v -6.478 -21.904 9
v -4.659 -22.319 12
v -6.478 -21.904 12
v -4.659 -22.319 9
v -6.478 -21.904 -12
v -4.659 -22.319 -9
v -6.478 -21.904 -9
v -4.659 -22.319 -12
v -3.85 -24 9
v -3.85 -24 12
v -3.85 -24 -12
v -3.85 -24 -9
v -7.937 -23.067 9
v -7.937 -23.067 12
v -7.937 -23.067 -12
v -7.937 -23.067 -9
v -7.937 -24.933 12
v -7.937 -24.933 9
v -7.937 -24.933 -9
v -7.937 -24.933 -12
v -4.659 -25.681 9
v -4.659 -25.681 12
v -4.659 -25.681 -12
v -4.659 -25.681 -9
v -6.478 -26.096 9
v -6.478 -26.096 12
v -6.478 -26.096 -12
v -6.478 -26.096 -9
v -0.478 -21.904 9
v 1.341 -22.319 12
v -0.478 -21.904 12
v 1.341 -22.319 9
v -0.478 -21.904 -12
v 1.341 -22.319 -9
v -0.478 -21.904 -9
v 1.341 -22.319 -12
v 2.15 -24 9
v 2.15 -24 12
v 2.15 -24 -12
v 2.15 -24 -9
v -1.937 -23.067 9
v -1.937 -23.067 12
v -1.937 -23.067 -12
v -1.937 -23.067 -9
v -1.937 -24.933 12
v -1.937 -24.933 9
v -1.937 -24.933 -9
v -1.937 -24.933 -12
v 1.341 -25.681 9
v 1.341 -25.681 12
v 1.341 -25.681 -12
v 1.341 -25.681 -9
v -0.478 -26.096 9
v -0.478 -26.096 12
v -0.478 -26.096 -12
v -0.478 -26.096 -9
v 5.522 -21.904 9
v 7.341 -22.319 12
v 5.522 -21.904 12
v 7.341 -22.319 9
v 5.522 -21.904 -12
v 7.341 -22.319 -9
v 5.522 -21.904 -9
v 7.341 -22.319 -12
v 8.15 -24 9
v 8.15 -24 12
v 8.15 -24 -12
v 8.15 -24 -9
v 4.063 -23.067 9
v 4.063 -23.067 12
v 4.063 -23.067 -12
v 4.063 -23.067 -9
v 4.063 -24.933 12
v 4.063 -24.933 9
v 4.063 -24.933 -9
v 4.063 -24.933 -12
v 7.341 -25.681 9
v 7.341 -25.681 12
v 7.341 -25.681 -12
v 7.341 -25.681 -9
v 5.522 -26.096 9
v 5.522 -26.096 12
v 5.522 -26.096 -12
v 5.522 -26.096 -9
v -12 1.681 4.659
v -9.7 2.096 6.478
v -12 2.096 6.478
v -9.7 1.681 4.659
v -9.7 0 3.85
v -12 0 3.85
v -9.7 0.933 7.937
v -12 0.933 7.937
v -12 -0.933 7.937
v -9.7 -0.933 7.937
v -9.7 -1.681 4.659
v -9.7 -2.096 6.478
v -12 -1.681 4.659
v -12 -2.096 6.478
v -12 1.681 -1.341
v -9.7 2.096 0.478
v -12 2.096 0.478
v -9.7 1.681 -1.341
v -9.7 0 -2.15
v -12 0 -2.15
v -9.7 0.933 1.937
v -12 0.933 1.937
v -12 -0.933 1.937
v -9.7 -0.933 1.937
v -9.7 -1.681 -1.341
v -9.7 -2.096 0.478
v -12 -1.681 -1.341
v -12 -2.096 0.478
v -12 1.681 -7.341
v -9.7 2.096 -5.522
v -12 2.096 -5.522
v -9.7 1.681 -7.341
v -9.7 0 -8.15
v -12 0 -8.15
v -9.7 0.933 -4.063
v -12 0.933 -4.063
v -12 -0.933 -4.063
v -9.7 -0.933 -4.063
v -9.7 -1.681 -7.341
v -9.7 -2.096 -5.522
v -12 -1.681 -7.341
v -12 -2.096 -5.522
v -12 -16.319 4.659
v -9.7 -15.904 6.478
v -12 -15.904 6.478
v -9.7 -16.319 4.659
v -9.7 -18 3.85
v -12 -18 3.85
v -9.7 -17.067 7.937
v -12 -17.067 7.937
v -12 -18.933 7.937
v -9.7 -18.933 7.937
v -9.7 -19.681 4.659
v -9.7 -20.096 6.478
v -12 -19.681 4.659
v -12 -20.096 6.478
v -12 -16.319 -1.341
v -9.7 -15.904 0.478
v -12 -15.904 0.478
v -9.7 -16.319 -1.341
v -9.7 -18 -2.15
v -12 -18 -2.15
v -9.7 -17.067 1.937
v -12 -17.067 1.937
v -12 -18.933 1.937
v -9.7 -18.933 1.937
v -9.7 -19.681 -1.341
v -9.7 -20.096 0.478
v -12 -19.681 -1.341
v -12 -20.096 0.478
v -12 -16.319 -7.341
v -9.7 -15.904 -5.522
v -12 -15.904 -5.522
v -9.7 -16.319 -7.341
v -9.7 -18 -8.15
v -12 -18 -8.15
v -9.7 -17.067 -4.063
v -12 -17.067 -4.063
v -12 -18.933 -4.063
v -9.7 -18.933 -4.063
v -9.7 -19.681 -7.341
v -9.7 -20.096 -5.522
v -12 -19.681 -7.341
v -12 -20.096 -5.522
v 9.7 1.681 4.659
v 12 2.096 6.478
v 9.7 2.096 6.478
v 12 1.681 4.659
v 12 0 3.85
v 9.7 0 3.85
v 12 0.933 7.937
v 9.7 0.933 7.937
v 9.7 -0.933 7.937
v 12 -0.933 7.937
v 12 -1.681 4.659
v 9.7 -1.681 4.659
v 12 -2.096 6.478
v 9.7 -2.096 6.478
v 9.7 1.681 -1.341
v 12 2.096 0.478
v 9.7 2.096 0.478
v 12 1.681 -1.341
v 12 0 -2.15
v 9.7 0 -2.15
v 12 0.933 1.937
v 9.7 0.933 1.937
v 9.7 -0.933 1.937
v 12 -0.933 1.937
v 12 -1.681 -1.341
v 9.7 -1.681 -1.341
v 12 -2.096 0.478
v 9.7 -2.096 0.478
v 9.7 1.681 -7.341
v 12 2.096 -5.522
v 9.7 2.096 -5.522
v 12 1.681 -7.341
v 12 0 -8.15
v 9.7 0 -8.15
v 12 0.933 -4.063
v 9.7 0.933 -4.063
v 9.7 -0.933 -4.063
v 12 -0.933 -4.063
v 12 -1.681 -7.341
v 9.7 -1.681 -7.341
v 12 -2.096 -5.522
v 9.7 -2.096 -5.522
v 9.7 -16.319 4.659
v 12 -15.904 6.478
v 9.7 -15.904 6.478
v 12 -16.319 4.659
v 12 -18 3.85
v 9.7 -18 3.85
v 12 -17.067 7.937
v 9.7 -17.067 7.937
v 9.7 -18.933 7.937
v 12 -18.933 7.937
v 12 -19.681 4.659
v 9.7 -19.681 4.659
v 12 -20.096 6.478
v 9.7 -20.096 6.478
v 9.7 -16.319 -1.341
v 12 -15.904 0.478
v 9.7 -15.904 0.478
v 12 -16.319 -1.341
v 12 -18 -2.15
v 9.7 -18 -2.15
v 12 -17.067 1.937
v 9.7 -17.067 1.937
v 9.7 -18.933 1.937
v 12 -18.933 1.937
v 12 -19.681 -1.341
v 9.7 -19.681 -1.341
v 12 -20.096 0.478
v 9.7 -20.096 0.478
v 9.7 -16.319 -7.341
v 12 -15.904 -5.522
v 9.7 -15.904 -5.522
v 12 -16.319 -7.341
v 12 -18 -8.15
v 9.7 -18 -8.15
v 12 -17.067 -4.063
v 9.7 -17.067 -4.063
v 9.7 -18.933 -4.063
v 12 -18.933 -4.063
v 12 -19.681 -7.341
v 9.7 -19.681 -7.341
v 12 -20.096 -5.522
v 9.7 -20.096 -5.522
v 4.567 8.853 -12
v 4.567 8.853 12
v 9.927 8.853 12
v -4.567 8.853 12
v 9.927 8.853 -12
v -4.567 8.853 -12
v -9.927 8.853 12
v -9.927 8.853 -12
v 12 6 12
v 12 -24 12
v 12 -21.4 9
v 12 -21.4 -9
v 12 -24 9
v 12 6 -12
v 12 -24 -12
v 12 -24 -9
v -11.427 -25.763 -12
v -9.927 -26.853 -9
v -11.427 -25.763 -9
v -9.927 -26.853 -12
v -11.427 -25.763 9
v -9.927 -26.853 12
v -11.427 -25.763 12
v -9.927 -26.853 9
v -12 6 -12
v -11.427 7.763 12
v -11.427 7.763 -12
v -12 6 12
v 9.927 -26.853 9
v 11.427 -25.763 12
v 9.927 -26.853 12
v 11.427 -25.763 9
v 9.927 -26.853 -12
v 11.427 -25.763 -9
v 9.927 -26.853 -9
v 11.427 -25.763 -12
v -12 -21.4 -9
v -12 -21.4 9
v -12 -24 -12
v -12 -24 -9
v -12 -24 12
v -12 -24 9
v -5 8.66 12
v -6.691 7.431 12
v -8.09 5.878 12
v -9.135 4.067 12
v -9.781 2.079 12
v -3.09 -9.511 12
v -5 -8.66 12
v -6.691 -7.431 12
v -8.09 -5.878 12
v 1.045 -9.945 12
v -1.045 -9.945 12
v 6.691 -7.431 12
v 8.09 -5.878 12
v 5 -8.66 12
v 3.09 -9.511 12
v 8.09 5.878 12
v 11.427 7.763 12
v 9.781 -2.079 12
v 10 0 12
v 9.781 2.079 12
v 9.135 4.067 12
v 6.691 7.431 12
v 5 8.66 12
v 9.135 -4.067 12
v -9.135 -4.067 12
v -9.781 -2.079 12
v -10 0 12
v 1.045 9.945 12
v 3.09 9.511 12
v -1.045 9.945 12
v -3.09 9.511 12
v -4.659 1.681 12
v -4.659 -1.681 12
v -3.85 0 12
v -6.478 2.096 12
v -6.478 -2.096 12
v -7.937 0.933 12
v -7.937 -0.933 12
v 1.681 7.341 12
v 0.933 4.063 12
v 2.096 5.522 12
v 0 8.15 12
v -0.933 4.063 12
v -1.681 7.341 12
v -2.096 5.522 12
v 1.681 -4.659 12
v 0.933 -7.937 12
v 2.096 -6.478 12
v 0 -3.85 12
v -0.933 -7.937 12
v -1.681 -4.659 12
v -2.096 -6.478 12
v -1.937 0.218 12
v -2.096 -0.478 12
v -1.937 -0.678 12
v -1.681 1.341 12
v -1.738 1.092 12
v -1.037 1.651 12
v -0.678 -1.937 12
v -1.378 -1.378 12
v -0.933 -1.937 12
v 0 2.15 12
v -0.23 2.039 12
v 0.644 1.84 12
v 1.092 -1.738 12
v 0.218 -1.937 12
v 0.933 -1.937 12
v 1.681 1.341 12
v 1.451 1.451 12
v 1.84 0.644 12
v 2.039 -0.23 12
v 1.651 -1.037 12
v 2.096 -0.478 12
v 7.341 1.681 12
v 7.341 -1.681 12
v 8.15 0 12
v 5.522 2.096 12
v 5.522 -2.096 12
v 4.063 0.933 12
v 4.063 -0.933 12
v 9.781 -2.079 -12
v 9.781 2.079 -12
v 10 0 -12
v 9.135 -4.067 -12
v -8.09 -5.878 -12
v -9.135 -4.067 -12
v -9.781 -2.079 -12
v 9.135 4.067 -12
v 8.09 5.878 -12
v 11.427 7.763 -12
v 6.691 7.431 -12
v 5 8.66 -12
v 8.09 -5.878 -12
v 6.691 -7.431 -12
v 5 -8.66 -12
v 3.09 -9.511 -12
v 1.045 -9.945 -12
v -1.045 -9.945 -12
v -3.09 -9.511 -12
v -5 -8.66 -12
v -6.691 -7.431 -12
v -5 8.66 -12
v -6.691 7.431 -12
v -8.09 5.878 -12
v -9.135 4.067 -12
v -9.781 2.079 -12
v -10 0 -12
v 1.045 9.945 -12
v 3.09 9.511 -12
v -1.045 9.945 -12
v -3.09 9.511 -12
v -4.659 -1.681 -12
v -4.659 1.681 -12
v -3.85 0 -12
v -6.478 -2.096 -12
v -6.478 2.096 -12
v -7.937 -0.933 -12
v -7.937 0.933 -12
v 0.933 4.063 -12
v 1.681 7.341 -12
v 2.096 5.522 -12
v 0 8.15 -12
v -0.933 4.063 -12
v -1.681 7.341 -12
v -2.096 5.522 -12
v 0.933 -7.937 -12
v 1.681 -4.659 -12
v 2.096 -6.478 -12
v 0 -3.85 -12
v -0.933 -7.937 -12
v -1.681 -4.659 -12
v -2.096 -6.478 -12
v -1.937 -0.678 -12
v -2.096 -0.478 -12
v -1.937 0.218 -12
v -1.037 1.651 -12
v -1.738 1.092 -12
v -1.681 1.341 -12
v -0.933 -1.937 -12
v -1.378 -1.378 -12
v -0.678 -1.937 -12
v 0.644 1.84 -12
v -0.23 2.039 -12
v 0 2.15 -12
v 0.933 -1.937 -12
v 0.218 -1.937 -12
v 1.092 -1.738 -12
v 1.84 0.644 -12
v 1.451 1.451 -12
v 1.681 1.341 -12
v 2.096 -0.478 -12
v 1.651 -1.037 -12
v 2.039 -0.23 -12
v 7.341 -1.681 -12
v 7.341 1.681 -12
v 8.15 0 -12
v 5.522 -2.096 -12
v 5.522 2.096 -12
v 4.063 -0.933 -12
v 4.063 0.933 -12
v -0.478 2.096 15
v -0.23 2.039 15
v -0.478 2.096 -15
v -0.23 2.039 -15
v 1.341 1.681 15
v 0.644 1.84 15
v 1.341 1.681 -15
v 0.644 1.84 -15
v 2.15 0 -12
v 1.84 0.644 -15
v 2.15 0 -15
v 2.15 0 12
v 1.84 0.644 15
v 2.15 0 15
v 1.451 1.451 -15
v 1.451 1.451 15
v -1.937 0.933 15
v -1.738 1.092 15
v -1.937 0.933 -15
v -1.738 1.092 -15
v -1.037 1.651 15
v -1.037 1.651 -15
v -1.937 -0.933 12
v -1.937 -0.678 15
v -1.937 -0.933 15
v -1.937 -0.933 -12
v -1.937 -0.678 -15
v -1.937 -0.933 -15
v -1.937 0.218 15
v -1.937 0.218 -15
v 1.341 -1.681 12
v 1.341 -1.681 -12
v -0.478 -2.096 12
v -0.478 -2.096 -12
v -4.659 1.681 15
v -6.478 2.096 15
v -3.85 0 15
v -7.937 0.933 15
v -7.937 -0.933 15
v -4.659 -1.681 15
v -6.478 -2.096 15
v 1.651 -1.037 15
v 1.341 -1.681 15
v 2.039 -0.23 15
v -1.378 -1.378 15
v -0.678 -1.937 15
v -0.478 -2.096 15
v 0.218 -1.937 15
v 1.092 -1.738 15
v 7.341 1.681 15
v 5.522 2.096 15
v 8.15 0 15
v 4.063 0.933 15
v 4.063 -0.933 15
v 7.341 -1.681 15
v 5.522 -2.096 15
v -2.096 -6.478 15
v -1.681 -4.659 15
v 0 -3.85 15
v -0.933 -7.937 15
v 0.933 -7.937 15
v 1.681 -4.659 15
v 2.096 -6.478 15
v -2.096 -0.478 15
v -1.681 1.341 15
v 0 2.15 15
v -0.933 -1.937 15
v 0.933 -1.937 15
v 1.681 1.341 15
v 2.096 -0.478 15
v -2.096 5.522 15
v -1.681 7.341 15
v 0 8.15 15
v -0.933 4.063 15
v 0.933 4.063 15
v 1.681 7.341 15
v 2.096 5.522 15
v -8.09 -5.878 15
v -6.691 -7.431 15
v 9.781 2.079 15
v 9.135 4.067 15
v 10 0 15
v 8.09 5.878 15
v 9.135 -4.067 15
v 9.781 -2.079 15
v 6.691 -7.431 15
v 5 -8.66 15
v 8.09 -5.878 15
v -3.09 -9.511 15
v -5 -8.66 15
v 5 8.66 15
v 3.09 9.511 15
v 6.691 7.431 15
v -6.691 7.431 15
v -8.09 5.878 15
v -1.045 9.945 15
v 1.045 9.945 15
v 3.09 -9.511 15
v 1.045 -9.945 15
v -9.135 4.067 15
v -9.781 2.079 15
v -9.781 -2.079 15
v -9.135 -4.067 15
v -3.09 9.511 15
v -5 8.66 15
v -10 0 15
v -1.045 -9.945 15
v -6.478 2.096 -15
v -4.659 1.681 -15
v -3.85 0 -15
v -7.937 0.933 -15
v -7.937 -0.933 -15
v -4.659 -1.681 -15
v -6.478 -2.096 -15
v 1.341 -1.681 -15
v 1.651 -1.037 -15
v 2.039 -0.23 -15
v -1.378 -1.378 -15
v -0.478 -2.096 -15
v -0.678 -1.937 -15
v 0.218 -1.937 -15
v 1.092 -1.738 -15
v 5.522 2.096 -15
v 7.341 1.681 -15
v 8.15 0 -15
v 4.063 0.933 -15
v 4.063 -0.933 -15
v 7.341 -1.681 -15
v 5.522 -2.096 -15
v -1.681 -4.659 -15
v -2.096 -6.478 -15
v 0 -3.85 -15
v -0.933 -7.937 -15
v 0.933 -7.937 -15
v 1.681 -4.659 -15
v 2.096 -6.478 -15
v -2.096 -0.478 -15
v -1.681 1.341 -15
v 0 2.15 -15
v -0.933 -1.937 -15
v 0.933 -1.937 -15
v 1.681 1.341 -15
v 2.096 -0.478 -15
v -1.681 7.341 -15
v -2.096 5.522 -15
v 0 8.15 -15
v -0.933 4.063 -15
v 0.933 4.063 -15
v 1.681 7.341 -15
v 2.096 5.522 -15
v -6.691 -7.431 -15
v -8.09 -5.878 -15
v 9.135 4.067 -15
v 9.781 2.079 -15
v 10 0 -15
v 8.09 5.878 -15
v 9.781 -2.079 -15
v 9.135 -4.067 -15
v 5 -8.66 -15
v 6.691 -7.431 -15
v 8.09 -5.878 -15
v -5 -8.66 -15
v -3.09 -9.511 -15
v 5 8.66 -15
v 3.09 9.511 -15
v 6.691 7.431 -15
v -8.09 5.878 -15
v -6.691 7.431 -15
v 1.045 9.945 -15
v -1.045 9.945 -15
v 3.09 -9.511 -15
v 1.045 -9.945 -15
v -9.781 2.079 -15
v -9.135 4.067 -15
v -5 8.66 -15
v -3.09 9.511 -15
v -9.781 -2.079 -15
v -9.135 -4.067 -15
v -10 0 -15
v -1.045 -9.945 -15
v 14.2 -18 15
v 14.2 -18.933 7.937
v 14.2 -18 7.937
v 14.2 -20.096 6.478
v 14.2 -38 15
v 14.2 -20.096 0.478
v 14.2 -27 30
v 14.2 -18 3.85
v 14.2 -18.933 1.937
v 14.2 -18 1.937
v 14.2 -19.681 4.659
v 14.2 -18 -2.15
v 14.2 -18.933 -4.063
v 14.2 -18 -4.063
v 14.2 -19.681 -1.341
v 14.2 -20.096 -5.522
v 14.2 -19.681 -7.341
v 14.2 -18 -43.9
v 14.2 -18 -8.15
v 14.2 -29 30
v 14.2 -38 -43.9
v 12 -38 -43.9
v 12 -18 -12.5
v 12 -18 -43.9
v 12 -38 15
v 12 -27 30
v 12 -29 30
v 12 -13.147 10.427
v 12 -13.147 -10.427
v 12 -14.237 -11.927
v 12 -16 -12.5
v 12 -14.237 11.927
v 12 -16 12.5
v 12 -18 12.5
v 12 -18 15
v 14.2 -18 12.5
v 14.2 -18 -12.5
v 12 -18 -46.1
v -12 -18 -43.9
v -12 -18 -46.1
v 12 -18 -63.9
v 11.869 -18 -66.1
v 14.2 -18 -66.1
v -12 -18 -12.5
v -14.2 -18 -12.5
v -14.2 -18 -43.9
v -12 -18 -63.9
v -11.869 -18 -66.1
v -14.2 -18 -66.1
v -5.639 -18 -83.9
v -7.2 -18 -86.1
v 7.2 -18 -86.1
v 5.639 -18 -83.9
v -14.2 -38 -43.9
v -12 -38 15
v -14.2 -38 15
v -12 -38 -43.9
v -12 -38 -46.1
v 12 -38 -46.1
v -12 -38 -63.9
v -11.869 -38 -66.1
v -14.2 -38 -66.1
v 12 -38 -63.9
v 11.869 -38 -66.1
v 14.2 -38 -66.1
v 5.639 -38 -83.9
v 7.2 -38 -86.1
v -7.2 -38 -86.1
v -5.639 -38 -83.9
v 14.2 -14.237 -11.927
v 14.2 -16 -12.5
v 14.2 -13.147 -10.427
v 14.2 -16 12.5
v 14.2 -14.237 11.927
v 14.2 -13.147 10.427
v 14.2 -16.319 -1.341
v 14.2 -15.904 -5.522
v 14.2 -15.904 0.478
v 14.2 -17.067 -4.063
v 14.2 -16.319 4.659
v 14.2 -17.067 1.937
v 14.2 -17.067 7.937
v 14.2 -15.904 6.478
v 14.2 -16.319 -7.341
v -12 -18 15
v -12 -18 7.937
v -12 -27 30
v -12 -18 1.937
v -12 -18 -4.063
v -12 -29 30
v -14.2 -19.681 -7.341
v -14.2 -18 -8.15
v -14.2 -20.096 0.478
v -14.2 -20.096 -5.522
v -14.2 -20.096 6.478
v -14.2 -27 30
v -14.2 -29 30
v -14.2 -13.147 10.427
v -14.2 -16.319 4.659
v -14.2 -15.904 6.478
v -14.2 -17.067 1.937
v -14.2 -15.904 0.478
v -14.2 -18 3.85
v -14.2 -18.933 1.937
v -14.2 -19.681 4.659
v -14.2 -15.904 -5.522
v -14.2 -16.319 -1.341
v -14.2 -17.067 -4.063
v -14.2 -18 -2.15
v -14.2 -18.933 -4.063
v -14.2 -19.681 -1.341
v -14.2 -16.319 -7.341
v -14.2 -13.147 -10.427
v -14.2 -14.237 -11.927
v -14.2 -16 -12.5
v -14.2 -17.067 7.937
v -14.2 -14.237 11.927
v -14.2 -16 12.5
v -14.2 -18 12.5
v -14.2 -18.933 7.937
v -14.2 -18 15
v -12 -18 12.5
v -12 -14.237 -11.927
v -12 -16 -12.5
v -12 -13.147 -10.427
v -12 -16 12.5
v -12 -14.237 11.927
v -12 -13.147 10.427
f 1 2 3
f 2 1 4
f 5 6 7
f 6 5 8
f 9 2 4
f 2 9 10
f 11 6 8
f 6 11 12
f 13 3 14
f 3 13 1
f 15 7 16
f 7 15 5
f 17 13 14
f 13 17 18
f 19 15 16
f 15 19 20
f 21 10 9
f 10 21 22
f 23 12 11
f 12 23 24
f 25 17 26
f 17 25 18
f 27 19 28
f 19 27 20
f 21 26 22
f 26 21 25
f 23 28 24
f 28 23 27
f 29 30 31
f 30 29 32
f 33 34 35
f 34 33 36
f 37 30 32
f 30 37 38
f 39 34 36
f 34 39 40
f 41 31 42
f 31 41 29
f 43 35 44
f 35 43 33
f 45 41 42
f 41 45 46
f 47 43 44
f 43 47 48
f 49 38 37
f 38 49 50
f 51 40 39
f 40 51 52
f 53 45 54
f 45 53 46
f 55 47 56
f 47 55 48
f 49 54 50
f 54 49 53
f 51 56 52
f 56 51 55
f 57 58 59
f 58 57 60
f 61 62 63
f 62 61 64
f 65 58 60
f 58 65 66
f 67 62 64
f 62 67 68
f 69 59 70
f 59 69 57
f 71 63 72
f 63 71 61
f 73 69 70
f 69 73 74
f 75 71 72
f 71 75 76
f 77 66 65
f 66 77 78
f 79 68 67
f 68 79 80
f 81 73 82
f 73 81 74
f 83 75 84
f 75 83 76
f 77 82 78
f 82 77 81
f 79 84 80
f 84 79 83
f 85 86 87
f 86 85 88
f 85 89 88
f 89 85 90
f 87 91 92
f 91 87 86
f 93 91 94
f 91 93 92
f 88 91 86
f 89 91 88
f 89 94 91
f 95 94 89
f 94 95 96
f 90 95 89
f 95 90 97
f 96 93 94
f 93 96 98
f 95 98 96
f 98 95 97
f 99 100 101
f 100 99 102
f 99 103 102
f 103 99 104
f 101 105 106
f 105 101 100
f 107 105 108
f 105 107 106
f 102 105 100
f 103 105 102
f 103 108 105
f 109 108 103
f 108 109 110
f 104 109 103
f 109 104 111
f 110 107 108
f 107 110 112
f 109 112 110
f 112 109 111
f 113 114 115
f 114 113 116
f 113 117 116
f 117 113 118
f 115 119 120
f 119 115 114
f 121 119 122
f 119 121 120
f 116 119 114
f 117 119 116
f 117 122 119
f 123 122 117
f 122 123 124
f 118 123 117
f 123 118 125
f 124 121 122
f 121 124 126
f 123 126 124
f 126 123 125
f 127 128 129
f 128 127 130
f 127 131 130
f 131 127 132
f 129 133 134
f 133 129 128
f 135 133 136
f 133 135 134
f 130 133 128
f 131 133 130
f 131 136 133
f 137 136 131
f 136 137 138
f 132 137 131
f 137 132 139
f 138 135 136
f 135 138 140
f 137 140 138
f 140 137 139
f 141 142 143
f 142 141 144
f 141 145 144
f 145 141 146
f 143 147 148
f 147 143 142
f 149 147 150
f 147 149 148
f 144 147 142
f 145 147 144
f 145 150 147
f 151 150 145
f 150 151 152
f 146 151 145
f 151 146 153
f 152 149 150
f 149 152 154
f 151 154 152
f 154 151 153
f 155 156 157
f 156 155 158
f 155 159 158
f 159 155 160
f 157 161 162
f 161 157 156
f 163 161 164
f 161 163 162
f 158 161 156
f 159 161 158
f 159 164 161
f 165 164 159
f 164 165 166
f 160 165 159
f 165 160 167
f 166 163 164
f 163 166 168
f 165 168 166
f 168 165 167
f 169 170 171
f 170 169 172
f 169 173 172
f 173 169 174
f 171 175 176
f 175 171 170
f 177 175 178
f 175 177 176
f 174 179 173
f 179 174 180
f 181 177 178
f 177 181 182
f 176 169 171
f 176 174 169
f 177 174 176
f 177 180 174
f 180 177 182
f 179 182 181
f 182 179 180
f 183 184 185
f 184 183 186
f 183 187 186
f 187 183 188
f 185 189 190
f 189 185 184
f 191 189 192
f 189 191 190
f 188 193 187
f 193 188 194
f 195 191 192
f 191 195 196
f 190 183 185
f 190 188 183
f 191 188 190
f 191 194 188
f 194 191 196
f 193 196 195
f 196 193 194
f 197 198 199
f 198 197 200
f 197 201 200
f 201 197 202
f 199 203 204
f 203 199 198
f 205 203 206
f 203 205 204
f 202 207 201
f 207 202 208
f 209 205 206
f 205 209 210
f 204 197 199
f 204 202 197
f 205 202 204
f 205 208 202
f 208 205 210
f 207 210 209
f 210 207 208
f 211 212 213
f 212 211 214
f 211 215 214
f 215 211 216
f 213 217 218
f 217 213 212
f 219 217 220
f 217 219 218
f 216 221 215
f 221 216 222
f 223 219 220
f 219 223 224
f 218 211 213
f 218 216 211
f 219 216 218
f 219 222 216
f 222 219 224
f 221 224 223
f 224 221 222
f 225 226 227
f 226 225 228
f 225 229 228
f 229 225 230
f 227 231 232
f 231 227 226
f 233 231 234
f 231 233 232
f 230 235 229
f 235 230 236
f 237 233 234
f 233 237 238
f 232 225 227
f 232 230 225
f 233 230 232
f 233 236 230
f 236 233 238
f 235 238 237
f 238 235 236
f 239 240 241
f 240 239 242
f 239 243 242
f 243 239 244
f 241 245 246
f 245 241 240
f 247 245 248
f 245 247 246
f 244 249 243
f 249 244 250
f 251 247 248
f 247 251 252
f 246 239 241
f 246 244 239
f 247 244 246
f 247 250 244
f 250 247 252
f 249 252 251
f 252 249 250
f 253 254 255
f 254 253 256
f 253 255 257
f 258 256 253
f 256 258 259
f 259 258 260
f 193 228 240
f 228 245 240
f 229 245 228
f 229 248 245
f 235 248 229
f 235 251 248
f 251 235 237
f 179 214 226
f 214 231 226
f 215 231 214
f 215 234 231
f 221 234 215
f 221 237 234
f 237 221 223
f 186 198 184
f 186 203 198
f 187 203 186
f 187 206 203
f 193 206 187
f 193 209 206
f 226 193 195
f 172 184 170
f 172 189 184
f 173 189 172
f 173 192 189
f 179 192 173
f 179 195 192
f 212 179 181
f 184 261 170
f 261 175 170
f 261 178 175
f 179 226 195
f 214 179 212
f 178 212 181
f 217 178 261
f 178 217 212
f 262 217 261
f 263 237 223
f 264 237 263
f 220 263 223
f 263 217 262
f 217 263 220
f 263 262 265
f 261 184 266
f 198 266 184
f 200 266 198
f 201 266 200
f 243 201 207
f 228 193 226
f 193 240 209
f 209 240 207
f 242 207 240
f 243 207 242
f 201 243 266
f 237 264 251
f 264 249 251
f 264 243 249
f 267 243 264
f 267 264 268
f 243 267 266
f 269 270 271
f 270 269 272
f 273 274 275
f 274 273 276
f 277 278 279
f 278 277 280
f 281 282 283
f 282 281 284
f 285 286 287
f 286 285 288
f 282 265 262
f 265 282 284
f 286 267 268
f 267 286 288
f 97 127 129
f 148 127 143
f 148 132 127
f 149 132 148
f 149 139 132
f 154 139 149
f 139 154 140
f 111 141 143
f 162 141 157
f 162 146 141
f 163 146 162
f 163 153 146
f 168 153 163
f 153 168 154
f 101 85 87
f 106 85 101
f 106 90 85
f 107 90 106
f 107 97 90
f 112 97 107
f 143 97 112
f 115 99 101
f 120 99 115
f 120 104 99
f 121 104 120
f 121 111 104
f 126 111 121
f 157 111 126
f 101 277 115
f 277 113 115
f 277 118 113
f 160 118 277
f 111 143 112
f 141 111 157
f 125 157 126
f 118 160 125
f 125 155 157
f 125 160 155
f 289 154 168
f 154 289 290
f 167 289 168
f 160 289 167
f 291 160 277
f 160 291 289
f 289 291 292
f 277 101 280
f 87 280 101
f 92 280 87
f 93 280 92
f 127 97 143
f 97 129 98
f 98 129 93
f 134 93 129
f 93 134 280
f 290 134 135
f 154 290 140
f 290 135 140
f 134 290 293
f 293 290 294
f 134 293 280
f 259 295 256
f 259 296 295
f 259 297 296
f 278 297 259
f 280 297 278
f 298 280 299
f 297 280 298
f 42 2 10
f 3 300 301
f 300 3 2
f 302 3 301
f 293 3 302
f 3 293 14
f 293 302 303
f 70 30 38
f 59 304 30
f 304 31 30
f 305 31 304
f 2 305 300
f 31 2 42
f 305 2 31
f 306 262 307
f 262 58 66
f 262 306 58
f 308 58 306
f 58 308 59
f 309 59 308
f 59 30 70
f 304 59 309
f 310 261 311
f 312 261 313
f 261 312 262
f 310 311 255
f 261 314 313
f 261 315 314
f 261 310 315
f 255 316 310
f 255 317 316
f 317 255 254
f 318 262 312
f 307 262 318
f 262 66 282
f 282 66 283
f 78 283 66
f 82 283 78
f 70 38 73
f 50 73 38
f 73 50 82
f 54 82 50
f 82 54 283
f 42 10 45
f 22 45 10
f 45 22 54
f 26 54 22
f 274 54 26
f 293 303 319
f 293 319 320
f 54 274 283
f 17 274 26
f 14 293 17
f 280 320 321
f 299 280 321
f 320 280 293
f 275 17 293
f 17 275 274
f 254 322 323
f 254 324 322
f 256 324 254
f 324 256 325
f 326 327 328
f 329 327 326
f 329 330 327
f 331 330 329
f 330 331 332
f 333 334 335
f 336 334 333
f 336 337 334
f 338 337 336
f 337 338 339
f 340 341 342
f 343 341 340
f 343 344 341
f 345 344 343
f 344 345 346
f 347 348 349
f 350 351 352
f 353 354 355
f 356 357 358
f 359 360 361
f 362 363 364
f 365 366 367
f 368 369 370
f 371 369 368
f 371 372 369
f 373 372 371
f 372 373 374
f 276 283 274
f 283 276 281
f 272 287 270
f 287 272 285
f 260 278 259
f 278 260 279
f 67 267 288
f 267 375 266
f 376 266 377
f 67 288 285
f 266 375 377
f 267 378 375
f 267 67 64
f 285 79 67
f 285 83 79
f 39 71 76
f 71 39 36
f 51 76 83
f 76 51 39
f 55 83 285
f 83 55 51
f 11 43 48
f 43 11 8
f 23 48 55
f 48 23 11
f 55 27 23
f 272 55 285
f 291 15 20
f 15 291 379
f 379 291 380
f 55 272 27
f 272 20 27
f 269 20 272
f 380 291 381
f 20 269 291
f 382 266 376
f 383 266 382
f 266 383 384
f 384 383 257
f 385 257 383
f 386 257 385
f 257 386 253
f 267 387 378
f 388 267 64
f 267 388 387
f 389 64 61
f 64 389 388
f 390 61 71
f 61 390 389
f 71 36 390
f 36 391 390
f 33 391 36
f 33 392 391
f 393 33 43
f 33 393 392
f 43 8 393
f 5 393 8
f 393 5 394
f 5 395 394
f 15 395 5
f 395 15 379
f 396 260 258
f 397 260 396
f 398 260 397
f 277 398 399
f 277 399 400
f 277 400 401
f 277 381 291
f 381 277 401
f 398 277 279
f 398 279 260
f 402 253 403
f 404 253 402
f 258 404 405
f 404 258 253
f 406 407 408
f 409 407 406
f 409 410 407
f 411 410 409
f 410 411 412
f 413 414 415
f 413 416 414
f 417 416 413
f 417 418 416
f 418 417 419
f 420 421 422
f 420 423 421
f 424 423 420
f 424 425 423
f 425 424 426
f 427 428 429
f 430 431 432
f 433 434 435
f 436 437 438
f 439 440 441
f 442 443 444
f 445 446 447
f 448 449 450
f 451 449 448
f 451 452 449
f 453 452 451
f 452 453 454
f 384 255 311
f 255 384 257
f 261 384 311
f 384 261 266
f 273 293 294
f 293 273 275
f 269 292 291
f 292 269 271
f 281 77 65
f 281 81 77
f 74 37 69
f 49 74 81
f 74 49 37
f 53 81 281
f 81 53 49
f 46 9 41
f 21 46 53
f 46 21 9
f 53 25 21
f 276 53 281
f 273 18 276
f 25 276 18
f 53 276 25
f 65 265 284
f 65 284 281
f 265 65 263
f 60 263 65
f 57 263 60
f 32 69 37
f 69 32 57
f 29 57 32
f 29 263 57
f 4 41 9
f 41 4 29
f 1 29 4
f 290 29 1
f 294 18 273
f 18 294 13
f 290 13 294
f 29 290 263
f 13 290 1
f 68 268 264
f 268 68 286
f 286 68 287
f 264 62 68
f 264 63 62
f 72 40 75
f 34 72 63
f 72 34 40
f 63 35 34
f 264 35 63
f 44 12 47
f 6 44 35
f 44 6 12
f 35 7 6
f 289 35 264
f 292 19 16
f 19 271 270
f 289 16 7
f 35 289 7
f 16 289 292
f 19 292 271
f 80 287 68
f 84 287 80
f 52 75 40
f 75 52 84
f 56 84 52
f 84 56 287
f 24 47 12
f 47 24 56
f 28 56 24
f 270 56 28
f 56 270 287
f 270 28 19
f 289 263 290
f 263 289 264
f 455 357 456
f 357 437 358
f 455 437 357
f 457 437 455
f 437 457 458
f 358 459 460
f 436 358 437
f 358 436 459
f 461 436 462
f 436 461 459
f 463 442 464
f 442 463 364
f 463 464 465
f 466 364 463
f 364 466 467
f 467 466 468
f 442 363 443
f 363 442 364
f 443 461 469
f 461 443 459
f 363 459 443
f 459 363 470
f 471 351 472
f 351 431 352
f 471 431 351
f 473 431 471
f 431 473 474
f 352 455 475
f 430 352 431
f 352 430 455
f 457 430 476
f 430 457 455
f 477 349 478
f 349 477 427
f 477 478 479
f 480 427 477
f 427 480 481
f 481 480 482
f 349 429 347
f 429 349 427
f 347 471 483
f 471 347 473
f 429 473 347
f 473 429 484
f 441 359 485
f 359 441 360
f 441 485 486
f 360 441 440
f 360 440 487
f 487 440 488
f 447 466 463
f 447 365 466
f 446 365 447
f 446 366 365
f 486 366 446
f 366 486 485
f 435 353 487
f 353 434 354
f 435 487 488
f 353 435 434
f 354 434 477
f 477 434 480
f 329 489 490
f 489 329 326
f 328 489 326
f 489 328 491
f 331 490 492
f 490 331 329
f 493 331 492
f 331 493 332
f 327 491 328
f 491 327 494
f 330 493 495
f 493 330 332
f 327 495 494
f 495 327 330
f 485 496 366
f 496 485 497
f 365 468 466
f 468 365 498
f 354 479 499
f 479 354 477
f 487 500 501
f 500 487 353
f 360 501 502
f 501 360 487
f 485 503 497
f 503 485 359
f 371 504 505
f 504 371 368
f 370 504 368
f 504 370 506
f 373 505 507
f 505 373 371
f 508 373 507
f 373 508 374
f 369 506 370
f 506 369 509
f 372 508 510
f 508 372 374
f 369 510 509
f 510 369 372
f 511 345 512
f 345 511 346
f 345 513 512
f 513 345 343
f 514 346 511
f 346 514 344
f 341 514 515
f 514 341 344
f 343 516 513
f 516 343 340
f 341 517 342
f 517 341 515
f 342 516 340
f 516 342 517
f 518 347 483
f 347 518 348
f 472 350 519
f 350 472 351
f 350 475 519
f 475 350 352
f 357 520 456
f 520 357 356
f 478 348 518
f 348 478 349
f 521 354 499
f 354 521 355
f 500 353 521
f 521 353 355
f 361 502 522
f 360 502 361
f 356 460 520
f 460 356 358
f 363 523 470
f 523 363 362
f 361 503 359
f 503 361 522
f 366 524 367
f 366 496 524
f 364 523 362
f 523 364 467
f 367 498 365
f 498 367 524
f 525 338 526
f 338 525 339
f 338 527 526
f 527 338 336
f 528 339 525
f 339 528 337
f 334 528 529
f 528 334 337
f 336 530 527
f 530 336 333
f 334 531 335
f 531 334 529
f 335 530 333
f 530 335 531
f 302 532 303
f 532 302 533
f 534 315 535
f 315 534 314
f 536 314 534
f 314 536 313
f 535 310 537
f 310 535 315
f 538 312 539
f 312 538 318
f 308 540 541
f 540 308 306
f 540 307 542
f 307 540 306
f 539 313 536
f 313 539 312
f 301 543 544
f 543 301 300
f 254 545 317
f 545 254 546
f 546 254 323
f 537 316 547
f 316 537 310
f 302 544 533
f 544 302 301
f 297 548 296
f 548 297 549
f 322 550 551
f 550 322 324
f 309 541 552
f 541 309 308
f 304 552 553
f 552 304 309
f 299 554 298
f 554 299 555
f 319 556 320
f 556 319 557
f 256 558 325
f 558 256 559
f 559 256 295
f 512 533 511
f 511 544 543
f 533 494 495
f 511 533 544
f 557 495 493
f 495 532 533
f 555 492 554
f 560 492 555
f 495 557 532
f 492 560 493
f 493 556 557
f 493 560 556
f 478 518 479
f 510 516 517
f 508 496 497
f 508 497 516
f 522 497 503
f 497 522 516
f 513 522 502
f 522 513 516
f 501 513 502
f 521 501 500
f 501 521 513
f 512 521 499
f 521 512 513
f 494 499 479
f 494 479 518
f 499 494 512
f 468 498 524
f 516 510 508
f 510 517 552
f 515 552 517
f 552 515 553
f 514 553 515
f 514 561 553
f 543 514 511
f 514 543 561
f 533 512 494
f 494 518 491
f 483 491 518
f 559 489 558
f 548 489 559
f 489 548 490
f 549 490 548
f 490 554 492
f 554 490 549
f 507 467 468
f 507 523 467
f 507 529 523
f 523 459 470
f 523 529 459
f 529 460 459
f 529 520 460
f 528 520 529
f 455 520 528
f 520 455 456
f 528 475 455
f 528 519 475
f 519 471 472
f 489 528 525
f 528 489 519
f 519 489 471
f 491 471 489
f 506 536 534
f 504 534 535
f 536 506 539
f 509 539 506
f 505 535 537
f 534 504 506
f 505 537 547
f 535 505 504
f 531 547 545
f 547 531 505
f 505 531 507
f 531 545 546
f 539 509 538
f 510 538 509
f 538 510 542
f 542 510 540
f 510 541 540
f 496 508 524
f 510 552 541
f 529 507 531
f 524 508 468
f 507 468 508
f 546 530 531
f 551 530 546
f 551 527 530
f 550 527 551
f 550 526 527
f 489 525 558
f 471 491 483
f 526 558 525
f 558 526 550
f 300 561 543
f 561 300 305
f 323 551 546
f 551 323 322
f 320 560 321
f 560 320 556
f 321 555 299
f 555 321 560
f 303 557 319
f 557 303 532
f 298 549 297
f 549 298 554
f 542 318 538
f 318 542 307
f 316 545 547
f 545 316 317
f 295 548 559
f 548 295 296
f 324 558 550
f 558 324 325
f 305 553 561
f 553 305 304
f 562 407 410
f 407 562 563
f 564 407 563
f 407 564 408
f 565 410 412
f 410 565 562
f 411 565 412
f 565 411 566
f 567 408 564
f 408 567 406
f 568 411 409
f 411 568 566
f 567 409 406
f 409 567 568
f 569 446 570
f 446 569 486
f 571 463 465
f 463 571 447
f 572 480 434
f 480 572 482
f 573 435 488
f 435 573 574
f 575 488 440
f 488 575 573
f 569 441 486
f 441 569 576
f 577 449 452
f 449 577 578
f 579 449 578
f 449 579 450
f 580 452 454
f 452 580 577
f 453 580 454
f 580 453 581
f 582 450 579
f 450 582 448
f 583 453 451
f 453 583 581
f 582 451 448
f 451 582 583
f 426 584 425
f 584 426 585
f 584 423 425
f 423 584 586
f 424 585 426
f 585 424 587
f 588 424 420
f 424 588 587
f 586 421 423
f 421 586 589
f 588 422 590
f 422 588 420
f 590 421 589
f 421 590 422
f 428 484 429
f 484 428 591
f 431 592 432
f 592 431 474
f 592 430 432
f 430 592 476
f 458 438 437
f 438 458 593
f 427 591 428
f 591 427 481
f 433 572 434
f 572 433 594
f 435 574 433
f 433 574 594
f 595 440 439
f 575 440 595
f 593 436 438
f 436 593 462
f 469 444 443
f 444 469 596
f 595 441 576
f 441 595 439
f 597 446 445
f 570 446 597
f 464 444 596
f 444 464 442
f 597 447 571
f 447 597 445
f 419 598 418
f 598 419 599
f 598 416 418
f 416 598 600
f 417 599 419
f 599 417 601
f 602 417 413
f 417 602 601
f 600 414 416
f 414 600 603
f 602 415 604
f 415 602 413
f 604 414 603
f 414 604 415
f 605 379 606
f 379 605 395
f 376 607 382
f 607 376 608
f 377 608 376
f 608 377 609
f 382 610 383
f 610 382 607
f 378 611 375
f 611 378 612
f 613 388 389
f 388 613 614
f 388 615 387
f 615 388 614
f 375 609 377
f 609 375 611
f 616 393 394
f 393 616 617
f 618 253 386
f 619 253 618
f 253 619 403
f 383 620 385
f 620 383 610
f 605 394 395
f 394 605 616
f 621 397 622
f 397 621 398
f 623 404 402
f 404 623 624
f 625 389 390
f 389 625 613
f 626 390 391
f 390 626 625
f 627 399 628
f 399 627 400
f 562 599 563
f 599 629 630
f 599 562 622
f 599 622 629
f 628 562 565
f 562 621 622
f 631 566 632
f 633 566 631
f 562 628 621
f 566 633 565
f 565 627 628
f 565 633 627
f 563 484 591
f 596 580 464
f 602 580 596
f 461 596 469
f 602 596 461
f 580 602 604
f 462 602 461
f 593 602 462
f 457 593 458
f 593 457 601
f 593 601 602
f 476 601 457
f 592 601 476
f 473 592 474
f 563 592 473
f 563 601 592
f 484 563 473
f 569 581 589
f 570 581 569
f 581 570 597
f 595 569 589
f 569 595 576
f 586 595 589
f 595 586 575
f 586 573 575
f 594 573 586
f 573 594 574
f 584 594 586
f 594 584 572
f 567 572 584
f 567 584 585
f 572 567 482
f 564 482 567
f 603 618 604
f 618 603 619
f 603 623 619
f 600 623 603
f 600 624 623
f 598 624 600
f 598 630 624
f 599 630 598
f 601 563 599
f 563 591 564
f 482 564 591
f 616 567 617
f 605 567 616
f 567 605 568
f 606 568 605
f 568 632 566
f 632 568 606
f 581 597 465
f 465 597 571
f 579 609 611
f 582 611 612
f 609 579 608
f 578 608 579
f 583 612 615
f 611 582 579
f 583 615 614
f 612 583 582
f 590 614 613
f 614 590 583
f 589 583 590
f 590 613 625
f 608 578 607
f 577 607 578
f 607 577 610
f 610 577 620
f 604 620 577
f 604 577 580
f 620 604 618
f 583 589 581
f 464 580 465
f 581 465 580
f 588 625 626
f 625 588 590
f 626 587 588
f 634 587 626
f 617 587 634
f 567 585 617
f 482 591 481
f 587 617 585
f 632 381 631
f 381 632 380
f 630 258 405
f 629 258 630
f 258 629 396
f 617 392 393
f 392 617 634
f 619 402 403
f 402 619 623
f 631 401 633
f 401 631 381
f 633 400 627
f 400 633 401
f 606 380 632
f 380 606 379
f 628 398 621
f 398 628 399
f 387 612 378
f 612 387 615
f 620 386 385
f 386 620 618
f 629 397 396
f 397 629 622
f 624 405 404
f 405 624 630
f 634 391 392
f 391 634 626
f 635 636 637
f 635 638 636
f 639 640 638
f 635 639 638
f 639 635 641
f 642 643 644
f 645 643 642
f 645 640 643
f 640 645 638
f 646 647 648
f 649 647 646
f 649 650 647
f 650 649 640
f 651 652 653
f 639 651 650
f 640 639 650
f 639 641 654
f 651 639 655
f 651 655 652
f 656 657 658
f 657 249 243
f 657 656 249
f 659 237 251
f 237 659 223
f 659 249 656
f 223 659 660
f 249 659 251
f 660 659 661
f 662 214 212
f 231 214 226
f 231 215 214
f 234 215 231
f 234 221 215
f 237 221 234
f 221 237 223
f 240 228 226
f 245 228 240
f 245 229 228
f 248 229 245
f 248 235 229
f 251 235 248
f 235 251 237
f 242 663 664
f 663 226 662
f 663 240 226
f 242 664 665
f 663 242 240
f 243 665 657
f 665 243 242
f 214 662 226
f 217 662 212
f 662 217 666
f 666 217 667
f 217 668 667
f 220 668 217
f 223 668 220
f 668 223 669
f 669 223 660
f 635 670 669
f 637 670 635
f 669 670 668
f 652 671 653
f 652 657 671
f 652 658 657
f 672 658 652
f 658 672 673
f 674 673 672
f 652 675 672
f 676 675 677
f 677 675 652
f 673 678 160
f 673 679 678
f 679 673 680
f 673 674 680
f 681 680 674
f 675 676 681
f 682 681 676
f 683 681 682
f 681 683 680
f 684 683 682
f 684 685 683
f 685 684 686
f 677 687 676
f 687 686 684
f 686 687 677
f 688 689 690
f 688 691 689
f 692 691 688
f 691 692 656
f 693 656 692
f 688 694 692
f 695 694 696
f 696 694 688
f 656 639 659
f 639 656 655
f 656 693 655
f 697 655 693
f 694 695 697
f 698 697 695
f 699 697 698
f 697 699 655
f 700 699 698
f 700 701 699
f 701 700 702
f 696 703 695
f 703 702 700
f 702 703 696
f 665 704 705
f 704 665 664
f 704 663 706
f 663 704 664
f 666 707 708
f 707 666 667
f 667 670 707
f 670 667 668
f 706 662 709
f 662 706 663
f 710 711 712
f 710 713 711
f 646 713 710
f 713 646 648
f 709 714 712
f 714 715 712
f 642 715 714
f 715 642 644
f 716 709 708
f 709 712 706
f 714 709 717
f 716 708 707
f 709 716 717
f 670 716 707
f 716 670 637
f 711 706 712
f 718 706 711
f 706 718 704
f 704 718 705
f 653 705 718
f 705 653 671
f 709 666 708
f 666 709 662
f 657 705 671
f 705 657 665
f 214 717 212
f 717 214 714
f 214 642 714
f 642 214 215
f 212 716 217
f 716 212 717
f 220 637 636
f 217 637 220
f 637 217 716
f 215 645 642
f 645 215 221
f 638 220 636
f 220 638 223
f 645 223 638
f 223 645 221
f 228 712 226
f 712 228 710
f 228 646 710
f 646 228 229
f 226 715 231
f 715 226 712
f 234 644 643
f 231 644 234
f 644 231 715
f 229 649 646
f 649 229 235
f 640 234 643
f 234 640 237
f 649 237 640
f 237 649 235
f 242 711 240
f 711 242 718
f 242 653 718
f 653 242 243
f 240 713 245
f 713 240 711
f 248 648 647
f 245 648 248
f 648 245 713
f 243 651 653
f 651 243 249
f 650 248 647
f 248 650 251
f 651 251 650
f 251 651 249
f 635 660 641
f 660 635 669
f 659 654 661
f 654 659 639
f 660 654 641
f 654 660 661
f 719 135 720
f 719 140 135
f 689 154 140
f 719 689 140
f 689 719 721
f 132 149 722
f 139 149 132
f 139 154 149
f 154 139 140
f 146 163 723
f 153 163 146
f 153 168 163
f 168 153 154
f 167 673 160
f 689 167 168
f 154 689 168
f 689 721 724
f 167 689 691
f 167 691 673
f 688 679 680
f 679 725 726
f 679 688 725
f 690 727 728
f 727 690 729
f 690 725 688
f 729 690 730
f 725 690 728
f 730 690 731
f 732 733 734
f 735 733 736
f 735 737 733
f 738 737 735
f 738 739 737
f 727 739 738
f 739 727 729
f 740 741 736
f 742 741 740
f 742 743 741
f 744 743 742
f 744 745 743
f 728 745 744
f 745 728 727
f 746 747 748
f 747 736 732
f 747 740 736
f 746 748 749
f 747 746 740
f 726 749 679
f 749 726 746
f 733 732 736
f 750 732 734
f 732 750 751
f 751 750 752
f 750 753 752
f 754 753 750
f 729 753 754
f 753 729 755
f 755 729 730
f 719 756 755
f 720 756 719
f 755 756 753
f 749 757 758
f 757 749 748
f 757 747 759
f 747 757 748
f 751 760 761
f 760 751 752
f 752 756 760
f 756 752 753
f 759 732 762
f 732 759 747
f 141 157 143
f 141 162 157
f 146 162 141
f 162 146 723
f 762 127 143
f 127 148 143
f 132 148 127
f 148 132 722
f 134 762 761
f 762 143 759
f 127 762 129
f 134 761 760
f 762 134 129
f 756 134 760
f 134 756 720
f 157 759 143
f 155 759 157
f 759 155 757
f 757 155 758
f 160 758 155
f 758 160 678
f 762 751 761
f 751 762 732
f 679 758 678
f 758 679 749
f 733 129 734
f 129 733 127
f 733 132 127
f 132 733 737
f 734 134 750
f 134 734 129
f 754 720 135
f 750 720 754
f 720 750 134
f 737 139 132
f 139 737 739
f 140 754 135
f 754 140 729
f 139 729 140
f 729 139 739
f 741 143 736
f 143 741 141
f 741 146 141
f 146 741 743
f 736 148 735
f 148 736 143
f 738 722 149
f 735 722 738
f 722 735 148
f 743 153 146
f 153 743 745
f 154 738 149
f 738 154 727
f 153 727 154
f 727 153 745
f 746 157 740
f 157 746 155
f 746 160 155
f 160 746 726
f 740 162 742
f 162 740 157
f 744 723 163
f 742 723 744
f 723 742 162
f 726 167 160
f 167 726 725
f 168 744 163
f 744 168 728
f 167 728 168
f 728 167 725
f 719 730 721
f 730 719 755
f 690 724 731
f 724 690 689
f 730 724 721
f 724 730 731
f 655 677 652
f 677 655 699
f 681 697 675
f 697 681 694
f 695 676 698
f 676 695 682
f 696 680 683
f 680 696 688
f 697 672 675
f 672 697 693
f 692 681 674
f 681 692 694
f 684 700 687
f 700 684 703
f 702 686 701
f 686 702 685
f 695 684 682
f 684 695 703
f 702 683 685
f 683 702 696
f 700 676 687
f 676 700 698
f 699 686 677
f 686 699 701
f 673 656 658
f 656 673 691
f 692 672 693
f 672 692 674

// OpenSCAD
// file: ../models/arm.scad
Collisions=false;
include <ollo.scad>;

module arm_pulley(pulley=false)
{
	c = pulley?[0.6,0.6,0.6]:[0.2,0.2,0.2];
    if (!Collisions) {
	    color(c) {
		difference() {
		    cylinder(d=20, h=OlloWidth);
		    servoArm(OlloWidth, false);
		}
	    }
    }
}

//:Model "Arm" [0.1,0.1,0.1]
module arm(pulley=false) {
    arm_pulley();
}

//:Model "Pulley" [0.6,0.6,0.6]
module pulley() {
    //:BOM "Ollo pulley" 0.2 http://www.robotis-shop-en.com/?act=shop_en.goods_view&GS=1590
    arm_pulley(true);
}

arm();
// file: ../models/motor.scad
Collisions=false;
include <ollo.scad>;
include <motor_values.scad>;
use <../util/rounded.scad>;

//:Model "Motor" [0.4,0.45,0.4]
//:Mass 16.7
module motor(thickness=2.2) {
    //:BOM "XL-320 Servo" 21.9 http://www.robotis-shop-en.com/?act=shop_en.goods_view&GS=1611
    translate([0,-MotorArmOffset,-MotorDepth/2]) {
        color([0.25,0.25,0.25]) {
            difference() {
                rounded(MotorWidth,MotorHeight,MotorDepth,3,center=true);

		if (!Collisions) {
			// Bottom
			translate([-MotorWidth/2-0.1,-MotorHeight/2-0.1,3])
			    cube([MotorWidth+0.2, 5.7, MotorDepth-6]);

			translate([0,-MotorHeight/2+3])
			    threeOllo(MotorDepth, false);

			// Motor shaft
			translate([0, MotorArmOffset])
			    olloHole(MotorDepth+5, false);

			// Side holes
			for (side=[-MotorWidth/2,MotorWidth/2-thickness]) {
			    translate([side,9,MotorDepth/2]) {
				rotate([0,90,0]) {
				    threeOllo(thickness, false);
				    translate([0,-3*OlloSpacing,0])
					threeOllo(thickness, false);
				}
			    }
			}
		}
            }
        }
    }
}

motor();
// file: ../util/rounded.scad
Collisions=false;

// Do a rounded cube
module rounded(x=10, y=10, z=10, r=3, center=false) {
    if (Collisions) {
        translate([0,0,center?(z/2):0])
            cube([x,y,z], center=center);
    } else {
        if (center) {
            translate([-(x/2),-(y/2),0])
                rounded(x, y, z, r);
        } else {
            translate([r,r,0])
                minkowski() {
                    cube([x-2*r,y-2*r,z/2]);
                    cylinder(h=z/2, r=r);
                }
        }
    }
}
// file: ../models/ollo.scad
Collisions=false;

// Diameter of plastic ollo holes
OlloHoles = 4.3;

// Width of Ollo "real" plastic
OlloWidth = 3;

// Distance between two ollo holes
OlloSpacing = 6;

module rivet()
{
    //:BOM "Ollo rivet" 0.05 http://www.robotis-shop-en.com/?act=shop_en.goods_view&GS=1605
}

// Do an Ollo hole on the part
module olloHole(depth=2.2, rivet=true)
{
    if (!Collisions) {
        if (rivet) {
	    rivet();
        }
        translate([0,0,-0.1])
            cylinder(depth+0.2, OlloHoles/2, OlloHoles/2);
    }	    
}

// Do 3 ollo holes
module threeOllo(depth=2.2, rivets=true)
{
    for (xy=[[-OlloSpacing,0],[0,0],[OlloSpacing,0]]) {
        translate([xy[0], xy[1], 0])
            olloHole(depth, rivets);
    }
}

// Do a servo arm holes
module servoArm(depth=2.2, rivets=true)
{
    if (rivets) {
        for (i=[1:5]) {
	    rivet();
	}
    }
    threeOllo(depth, false);
    rotate([0,0,90])
        threeOllo(depth, false);
}
// file: ../models/motor_values.scad
// Motor dimensions
MotorWidth = 24; 
MotorHeight = 36; 
MotorDepth = 24; 
MotorArmOffset = 9;
// file: ../models/motor_arm.scad
include <motor.scad>;
use <arm.scad>;

module motorArm(counterArm=true) {
    motor();
    translate([0,0,MotorDepth/2])
        arm();
    if (counterArm) {
        translate([0,0,-MotorDepth/2-OlloWidth]) {
            pulley();
        }
    }
}

motorArm();
// file: ../parts/leg.scad
Collisions=false;
SphereTip=false;
include <../models/motor_values.scad>;
use <../models/ollo.scad>;
use <../util/rounded.scad>;

//:Part
module leg(sizeA=60, sizeB=20, sizeC=20, sizeBottom=10,
        sizeTop=15, mode="arm", fixationAngle=0, thickness=2.2, holesPosition=15, print=false)
{
    xOffset = (mode == "side") ? -10 : 0;
    spacing = (mode == "side" || mode == "bottom") ? MotorWidth : MotorWidth+6;

    module legSide()
    {
        difference() {
            union() {
                translate([0,0,sizeA/2])
                    rotate([0,90,0]) {
                        cube([sizeA, 20, thickness], center=true);
                        if (mode == "side") {
                            translate([15-sizeA/2, 10, -thickness/2])
                                rotate([0,0,+fixationAngle])
                                rounded(25,10,thickness, center=true);
                        }
                    }
            }
            translate([-thickness, 0, sizeA-holesPosition]) {
                rotate([90,0,90]) {
                    if (mode == "arm") {
                        servoArm(2*thickness);
                    }
                }
                if (mode == "side") {
                    translate([0,10,0])
                        rotate([90,90-fixationAngle,90])
                        threeOllo(2*thickness);
                }
		if (mode == "bottom") {
                    translate([0,0,0])
                        rotate([90,fixationAngle,90])
                        threeOllo(2*thickness);
                }
            }
        }
	if (Collisions) {
		translate([0,0,sizeA+sizeTop-10]) {
			rotate([45,0,0])
			rotate([0,-90,0])
			cube([14,14,thickness],center=true);
		}
	} else {
		translate([-thickness/2,0,sizeA]) {
		    rotate([90,0,90])
			linear_extrude(thickness)
			polygon([[-10,0],[-1,sizeTop],[1,sizeTop],[10,0]]);
		}
	}
    }

    module biais() {
        Dx = (spacing-sizeBottom)/2;
        Dy = sizeC;
        Dl = sqrt(pow(Dx,2)+pow(Dy,2));

        translate([-(spacing/2)-thickness,-10,-(sizeB+thickness/2)])
            rotate([0,atan2(Dy,Dx),0])
            cube([Dl,20,thickness]);
    }

    if (print) {
        translate([0,0,10-xOffset])
            rotate([90,0,0])
            leg(sizeA, sizeB, sizeC, sizeBottom,
                    sizeTop, mode, fixationAngle, thickness, false);
    } else {
        translate([0,xOffset,-sizeA+holesPosition]) {
            cube([spacing+thickness*2, 20, thickness], center=true);

            translate([spacing/2+thickness/2,0,0])
                legSide();
            translate([-(spacing/2+thickness/2),0,0])
                legSide();

		if (!SphereTip || !Collisions) {
		    translate([0,0,-sizeB])
			cube([spacing+thickness*2, 20, thickness], center=true);
		    translate([spacing/2+thickness/2,0,-sizeB/2])
			cube([thickness,20,sizeB], center=true);
		    translate([-(spacing/2+thickness/2),0,-sizeB/2])
			cube([thickness,20,sizeB], center=true);

		    translate([0,0,-(sizeB+sizeC)])
			cube([sizeBottom+thickness*2, 20, thickness], center=true);

		    biais();
		    mirror([1,0,0])
			biais();
		} else {
		    translate([0,0,-(sizeB+sizeC+thickness)+20])
			sphere(20);  
		}
		translate([0,0,-(sizeB+sizeC+thickness)]) {
                        //:Tip
			//sphere(7);
		}
        }
    }
}

leg();
// main file
use <../parts/leg.scad>;
use <../models/motor_arm.scad>;

//:Component "Biais leg"
//:Description "Leg on motor side"
//:Parameter SizeA "Size of the first part"
//:Parameter SizeB "Size of the second part"
//:Parameter SizeC "Size of the third part"
//:Parameter SizeBottom "Size of the bottom"
//:Parameter SizeTop "Size of the top"
//:Parameter FixationAngle "Fixation angle"
//:Parameter Thickness "Thickness of the part"
module biais_leg(SizeA=60, SizeB=20, SizeC=20, SizeBottom=10,
        SizeTop=15, FixationAngle=0, Thickness=2.2)
{
    //:Anchor motor male
    motorArm();

    translate([0,-(18),0]) {
    rotate([0,0,FixationAngle]) {
	leg(SizeA, SizeB, SizeC, SizeBottom, SizeTop, "side", FixationAngle, Thickness);
    }
    }
}

biais_leg();
